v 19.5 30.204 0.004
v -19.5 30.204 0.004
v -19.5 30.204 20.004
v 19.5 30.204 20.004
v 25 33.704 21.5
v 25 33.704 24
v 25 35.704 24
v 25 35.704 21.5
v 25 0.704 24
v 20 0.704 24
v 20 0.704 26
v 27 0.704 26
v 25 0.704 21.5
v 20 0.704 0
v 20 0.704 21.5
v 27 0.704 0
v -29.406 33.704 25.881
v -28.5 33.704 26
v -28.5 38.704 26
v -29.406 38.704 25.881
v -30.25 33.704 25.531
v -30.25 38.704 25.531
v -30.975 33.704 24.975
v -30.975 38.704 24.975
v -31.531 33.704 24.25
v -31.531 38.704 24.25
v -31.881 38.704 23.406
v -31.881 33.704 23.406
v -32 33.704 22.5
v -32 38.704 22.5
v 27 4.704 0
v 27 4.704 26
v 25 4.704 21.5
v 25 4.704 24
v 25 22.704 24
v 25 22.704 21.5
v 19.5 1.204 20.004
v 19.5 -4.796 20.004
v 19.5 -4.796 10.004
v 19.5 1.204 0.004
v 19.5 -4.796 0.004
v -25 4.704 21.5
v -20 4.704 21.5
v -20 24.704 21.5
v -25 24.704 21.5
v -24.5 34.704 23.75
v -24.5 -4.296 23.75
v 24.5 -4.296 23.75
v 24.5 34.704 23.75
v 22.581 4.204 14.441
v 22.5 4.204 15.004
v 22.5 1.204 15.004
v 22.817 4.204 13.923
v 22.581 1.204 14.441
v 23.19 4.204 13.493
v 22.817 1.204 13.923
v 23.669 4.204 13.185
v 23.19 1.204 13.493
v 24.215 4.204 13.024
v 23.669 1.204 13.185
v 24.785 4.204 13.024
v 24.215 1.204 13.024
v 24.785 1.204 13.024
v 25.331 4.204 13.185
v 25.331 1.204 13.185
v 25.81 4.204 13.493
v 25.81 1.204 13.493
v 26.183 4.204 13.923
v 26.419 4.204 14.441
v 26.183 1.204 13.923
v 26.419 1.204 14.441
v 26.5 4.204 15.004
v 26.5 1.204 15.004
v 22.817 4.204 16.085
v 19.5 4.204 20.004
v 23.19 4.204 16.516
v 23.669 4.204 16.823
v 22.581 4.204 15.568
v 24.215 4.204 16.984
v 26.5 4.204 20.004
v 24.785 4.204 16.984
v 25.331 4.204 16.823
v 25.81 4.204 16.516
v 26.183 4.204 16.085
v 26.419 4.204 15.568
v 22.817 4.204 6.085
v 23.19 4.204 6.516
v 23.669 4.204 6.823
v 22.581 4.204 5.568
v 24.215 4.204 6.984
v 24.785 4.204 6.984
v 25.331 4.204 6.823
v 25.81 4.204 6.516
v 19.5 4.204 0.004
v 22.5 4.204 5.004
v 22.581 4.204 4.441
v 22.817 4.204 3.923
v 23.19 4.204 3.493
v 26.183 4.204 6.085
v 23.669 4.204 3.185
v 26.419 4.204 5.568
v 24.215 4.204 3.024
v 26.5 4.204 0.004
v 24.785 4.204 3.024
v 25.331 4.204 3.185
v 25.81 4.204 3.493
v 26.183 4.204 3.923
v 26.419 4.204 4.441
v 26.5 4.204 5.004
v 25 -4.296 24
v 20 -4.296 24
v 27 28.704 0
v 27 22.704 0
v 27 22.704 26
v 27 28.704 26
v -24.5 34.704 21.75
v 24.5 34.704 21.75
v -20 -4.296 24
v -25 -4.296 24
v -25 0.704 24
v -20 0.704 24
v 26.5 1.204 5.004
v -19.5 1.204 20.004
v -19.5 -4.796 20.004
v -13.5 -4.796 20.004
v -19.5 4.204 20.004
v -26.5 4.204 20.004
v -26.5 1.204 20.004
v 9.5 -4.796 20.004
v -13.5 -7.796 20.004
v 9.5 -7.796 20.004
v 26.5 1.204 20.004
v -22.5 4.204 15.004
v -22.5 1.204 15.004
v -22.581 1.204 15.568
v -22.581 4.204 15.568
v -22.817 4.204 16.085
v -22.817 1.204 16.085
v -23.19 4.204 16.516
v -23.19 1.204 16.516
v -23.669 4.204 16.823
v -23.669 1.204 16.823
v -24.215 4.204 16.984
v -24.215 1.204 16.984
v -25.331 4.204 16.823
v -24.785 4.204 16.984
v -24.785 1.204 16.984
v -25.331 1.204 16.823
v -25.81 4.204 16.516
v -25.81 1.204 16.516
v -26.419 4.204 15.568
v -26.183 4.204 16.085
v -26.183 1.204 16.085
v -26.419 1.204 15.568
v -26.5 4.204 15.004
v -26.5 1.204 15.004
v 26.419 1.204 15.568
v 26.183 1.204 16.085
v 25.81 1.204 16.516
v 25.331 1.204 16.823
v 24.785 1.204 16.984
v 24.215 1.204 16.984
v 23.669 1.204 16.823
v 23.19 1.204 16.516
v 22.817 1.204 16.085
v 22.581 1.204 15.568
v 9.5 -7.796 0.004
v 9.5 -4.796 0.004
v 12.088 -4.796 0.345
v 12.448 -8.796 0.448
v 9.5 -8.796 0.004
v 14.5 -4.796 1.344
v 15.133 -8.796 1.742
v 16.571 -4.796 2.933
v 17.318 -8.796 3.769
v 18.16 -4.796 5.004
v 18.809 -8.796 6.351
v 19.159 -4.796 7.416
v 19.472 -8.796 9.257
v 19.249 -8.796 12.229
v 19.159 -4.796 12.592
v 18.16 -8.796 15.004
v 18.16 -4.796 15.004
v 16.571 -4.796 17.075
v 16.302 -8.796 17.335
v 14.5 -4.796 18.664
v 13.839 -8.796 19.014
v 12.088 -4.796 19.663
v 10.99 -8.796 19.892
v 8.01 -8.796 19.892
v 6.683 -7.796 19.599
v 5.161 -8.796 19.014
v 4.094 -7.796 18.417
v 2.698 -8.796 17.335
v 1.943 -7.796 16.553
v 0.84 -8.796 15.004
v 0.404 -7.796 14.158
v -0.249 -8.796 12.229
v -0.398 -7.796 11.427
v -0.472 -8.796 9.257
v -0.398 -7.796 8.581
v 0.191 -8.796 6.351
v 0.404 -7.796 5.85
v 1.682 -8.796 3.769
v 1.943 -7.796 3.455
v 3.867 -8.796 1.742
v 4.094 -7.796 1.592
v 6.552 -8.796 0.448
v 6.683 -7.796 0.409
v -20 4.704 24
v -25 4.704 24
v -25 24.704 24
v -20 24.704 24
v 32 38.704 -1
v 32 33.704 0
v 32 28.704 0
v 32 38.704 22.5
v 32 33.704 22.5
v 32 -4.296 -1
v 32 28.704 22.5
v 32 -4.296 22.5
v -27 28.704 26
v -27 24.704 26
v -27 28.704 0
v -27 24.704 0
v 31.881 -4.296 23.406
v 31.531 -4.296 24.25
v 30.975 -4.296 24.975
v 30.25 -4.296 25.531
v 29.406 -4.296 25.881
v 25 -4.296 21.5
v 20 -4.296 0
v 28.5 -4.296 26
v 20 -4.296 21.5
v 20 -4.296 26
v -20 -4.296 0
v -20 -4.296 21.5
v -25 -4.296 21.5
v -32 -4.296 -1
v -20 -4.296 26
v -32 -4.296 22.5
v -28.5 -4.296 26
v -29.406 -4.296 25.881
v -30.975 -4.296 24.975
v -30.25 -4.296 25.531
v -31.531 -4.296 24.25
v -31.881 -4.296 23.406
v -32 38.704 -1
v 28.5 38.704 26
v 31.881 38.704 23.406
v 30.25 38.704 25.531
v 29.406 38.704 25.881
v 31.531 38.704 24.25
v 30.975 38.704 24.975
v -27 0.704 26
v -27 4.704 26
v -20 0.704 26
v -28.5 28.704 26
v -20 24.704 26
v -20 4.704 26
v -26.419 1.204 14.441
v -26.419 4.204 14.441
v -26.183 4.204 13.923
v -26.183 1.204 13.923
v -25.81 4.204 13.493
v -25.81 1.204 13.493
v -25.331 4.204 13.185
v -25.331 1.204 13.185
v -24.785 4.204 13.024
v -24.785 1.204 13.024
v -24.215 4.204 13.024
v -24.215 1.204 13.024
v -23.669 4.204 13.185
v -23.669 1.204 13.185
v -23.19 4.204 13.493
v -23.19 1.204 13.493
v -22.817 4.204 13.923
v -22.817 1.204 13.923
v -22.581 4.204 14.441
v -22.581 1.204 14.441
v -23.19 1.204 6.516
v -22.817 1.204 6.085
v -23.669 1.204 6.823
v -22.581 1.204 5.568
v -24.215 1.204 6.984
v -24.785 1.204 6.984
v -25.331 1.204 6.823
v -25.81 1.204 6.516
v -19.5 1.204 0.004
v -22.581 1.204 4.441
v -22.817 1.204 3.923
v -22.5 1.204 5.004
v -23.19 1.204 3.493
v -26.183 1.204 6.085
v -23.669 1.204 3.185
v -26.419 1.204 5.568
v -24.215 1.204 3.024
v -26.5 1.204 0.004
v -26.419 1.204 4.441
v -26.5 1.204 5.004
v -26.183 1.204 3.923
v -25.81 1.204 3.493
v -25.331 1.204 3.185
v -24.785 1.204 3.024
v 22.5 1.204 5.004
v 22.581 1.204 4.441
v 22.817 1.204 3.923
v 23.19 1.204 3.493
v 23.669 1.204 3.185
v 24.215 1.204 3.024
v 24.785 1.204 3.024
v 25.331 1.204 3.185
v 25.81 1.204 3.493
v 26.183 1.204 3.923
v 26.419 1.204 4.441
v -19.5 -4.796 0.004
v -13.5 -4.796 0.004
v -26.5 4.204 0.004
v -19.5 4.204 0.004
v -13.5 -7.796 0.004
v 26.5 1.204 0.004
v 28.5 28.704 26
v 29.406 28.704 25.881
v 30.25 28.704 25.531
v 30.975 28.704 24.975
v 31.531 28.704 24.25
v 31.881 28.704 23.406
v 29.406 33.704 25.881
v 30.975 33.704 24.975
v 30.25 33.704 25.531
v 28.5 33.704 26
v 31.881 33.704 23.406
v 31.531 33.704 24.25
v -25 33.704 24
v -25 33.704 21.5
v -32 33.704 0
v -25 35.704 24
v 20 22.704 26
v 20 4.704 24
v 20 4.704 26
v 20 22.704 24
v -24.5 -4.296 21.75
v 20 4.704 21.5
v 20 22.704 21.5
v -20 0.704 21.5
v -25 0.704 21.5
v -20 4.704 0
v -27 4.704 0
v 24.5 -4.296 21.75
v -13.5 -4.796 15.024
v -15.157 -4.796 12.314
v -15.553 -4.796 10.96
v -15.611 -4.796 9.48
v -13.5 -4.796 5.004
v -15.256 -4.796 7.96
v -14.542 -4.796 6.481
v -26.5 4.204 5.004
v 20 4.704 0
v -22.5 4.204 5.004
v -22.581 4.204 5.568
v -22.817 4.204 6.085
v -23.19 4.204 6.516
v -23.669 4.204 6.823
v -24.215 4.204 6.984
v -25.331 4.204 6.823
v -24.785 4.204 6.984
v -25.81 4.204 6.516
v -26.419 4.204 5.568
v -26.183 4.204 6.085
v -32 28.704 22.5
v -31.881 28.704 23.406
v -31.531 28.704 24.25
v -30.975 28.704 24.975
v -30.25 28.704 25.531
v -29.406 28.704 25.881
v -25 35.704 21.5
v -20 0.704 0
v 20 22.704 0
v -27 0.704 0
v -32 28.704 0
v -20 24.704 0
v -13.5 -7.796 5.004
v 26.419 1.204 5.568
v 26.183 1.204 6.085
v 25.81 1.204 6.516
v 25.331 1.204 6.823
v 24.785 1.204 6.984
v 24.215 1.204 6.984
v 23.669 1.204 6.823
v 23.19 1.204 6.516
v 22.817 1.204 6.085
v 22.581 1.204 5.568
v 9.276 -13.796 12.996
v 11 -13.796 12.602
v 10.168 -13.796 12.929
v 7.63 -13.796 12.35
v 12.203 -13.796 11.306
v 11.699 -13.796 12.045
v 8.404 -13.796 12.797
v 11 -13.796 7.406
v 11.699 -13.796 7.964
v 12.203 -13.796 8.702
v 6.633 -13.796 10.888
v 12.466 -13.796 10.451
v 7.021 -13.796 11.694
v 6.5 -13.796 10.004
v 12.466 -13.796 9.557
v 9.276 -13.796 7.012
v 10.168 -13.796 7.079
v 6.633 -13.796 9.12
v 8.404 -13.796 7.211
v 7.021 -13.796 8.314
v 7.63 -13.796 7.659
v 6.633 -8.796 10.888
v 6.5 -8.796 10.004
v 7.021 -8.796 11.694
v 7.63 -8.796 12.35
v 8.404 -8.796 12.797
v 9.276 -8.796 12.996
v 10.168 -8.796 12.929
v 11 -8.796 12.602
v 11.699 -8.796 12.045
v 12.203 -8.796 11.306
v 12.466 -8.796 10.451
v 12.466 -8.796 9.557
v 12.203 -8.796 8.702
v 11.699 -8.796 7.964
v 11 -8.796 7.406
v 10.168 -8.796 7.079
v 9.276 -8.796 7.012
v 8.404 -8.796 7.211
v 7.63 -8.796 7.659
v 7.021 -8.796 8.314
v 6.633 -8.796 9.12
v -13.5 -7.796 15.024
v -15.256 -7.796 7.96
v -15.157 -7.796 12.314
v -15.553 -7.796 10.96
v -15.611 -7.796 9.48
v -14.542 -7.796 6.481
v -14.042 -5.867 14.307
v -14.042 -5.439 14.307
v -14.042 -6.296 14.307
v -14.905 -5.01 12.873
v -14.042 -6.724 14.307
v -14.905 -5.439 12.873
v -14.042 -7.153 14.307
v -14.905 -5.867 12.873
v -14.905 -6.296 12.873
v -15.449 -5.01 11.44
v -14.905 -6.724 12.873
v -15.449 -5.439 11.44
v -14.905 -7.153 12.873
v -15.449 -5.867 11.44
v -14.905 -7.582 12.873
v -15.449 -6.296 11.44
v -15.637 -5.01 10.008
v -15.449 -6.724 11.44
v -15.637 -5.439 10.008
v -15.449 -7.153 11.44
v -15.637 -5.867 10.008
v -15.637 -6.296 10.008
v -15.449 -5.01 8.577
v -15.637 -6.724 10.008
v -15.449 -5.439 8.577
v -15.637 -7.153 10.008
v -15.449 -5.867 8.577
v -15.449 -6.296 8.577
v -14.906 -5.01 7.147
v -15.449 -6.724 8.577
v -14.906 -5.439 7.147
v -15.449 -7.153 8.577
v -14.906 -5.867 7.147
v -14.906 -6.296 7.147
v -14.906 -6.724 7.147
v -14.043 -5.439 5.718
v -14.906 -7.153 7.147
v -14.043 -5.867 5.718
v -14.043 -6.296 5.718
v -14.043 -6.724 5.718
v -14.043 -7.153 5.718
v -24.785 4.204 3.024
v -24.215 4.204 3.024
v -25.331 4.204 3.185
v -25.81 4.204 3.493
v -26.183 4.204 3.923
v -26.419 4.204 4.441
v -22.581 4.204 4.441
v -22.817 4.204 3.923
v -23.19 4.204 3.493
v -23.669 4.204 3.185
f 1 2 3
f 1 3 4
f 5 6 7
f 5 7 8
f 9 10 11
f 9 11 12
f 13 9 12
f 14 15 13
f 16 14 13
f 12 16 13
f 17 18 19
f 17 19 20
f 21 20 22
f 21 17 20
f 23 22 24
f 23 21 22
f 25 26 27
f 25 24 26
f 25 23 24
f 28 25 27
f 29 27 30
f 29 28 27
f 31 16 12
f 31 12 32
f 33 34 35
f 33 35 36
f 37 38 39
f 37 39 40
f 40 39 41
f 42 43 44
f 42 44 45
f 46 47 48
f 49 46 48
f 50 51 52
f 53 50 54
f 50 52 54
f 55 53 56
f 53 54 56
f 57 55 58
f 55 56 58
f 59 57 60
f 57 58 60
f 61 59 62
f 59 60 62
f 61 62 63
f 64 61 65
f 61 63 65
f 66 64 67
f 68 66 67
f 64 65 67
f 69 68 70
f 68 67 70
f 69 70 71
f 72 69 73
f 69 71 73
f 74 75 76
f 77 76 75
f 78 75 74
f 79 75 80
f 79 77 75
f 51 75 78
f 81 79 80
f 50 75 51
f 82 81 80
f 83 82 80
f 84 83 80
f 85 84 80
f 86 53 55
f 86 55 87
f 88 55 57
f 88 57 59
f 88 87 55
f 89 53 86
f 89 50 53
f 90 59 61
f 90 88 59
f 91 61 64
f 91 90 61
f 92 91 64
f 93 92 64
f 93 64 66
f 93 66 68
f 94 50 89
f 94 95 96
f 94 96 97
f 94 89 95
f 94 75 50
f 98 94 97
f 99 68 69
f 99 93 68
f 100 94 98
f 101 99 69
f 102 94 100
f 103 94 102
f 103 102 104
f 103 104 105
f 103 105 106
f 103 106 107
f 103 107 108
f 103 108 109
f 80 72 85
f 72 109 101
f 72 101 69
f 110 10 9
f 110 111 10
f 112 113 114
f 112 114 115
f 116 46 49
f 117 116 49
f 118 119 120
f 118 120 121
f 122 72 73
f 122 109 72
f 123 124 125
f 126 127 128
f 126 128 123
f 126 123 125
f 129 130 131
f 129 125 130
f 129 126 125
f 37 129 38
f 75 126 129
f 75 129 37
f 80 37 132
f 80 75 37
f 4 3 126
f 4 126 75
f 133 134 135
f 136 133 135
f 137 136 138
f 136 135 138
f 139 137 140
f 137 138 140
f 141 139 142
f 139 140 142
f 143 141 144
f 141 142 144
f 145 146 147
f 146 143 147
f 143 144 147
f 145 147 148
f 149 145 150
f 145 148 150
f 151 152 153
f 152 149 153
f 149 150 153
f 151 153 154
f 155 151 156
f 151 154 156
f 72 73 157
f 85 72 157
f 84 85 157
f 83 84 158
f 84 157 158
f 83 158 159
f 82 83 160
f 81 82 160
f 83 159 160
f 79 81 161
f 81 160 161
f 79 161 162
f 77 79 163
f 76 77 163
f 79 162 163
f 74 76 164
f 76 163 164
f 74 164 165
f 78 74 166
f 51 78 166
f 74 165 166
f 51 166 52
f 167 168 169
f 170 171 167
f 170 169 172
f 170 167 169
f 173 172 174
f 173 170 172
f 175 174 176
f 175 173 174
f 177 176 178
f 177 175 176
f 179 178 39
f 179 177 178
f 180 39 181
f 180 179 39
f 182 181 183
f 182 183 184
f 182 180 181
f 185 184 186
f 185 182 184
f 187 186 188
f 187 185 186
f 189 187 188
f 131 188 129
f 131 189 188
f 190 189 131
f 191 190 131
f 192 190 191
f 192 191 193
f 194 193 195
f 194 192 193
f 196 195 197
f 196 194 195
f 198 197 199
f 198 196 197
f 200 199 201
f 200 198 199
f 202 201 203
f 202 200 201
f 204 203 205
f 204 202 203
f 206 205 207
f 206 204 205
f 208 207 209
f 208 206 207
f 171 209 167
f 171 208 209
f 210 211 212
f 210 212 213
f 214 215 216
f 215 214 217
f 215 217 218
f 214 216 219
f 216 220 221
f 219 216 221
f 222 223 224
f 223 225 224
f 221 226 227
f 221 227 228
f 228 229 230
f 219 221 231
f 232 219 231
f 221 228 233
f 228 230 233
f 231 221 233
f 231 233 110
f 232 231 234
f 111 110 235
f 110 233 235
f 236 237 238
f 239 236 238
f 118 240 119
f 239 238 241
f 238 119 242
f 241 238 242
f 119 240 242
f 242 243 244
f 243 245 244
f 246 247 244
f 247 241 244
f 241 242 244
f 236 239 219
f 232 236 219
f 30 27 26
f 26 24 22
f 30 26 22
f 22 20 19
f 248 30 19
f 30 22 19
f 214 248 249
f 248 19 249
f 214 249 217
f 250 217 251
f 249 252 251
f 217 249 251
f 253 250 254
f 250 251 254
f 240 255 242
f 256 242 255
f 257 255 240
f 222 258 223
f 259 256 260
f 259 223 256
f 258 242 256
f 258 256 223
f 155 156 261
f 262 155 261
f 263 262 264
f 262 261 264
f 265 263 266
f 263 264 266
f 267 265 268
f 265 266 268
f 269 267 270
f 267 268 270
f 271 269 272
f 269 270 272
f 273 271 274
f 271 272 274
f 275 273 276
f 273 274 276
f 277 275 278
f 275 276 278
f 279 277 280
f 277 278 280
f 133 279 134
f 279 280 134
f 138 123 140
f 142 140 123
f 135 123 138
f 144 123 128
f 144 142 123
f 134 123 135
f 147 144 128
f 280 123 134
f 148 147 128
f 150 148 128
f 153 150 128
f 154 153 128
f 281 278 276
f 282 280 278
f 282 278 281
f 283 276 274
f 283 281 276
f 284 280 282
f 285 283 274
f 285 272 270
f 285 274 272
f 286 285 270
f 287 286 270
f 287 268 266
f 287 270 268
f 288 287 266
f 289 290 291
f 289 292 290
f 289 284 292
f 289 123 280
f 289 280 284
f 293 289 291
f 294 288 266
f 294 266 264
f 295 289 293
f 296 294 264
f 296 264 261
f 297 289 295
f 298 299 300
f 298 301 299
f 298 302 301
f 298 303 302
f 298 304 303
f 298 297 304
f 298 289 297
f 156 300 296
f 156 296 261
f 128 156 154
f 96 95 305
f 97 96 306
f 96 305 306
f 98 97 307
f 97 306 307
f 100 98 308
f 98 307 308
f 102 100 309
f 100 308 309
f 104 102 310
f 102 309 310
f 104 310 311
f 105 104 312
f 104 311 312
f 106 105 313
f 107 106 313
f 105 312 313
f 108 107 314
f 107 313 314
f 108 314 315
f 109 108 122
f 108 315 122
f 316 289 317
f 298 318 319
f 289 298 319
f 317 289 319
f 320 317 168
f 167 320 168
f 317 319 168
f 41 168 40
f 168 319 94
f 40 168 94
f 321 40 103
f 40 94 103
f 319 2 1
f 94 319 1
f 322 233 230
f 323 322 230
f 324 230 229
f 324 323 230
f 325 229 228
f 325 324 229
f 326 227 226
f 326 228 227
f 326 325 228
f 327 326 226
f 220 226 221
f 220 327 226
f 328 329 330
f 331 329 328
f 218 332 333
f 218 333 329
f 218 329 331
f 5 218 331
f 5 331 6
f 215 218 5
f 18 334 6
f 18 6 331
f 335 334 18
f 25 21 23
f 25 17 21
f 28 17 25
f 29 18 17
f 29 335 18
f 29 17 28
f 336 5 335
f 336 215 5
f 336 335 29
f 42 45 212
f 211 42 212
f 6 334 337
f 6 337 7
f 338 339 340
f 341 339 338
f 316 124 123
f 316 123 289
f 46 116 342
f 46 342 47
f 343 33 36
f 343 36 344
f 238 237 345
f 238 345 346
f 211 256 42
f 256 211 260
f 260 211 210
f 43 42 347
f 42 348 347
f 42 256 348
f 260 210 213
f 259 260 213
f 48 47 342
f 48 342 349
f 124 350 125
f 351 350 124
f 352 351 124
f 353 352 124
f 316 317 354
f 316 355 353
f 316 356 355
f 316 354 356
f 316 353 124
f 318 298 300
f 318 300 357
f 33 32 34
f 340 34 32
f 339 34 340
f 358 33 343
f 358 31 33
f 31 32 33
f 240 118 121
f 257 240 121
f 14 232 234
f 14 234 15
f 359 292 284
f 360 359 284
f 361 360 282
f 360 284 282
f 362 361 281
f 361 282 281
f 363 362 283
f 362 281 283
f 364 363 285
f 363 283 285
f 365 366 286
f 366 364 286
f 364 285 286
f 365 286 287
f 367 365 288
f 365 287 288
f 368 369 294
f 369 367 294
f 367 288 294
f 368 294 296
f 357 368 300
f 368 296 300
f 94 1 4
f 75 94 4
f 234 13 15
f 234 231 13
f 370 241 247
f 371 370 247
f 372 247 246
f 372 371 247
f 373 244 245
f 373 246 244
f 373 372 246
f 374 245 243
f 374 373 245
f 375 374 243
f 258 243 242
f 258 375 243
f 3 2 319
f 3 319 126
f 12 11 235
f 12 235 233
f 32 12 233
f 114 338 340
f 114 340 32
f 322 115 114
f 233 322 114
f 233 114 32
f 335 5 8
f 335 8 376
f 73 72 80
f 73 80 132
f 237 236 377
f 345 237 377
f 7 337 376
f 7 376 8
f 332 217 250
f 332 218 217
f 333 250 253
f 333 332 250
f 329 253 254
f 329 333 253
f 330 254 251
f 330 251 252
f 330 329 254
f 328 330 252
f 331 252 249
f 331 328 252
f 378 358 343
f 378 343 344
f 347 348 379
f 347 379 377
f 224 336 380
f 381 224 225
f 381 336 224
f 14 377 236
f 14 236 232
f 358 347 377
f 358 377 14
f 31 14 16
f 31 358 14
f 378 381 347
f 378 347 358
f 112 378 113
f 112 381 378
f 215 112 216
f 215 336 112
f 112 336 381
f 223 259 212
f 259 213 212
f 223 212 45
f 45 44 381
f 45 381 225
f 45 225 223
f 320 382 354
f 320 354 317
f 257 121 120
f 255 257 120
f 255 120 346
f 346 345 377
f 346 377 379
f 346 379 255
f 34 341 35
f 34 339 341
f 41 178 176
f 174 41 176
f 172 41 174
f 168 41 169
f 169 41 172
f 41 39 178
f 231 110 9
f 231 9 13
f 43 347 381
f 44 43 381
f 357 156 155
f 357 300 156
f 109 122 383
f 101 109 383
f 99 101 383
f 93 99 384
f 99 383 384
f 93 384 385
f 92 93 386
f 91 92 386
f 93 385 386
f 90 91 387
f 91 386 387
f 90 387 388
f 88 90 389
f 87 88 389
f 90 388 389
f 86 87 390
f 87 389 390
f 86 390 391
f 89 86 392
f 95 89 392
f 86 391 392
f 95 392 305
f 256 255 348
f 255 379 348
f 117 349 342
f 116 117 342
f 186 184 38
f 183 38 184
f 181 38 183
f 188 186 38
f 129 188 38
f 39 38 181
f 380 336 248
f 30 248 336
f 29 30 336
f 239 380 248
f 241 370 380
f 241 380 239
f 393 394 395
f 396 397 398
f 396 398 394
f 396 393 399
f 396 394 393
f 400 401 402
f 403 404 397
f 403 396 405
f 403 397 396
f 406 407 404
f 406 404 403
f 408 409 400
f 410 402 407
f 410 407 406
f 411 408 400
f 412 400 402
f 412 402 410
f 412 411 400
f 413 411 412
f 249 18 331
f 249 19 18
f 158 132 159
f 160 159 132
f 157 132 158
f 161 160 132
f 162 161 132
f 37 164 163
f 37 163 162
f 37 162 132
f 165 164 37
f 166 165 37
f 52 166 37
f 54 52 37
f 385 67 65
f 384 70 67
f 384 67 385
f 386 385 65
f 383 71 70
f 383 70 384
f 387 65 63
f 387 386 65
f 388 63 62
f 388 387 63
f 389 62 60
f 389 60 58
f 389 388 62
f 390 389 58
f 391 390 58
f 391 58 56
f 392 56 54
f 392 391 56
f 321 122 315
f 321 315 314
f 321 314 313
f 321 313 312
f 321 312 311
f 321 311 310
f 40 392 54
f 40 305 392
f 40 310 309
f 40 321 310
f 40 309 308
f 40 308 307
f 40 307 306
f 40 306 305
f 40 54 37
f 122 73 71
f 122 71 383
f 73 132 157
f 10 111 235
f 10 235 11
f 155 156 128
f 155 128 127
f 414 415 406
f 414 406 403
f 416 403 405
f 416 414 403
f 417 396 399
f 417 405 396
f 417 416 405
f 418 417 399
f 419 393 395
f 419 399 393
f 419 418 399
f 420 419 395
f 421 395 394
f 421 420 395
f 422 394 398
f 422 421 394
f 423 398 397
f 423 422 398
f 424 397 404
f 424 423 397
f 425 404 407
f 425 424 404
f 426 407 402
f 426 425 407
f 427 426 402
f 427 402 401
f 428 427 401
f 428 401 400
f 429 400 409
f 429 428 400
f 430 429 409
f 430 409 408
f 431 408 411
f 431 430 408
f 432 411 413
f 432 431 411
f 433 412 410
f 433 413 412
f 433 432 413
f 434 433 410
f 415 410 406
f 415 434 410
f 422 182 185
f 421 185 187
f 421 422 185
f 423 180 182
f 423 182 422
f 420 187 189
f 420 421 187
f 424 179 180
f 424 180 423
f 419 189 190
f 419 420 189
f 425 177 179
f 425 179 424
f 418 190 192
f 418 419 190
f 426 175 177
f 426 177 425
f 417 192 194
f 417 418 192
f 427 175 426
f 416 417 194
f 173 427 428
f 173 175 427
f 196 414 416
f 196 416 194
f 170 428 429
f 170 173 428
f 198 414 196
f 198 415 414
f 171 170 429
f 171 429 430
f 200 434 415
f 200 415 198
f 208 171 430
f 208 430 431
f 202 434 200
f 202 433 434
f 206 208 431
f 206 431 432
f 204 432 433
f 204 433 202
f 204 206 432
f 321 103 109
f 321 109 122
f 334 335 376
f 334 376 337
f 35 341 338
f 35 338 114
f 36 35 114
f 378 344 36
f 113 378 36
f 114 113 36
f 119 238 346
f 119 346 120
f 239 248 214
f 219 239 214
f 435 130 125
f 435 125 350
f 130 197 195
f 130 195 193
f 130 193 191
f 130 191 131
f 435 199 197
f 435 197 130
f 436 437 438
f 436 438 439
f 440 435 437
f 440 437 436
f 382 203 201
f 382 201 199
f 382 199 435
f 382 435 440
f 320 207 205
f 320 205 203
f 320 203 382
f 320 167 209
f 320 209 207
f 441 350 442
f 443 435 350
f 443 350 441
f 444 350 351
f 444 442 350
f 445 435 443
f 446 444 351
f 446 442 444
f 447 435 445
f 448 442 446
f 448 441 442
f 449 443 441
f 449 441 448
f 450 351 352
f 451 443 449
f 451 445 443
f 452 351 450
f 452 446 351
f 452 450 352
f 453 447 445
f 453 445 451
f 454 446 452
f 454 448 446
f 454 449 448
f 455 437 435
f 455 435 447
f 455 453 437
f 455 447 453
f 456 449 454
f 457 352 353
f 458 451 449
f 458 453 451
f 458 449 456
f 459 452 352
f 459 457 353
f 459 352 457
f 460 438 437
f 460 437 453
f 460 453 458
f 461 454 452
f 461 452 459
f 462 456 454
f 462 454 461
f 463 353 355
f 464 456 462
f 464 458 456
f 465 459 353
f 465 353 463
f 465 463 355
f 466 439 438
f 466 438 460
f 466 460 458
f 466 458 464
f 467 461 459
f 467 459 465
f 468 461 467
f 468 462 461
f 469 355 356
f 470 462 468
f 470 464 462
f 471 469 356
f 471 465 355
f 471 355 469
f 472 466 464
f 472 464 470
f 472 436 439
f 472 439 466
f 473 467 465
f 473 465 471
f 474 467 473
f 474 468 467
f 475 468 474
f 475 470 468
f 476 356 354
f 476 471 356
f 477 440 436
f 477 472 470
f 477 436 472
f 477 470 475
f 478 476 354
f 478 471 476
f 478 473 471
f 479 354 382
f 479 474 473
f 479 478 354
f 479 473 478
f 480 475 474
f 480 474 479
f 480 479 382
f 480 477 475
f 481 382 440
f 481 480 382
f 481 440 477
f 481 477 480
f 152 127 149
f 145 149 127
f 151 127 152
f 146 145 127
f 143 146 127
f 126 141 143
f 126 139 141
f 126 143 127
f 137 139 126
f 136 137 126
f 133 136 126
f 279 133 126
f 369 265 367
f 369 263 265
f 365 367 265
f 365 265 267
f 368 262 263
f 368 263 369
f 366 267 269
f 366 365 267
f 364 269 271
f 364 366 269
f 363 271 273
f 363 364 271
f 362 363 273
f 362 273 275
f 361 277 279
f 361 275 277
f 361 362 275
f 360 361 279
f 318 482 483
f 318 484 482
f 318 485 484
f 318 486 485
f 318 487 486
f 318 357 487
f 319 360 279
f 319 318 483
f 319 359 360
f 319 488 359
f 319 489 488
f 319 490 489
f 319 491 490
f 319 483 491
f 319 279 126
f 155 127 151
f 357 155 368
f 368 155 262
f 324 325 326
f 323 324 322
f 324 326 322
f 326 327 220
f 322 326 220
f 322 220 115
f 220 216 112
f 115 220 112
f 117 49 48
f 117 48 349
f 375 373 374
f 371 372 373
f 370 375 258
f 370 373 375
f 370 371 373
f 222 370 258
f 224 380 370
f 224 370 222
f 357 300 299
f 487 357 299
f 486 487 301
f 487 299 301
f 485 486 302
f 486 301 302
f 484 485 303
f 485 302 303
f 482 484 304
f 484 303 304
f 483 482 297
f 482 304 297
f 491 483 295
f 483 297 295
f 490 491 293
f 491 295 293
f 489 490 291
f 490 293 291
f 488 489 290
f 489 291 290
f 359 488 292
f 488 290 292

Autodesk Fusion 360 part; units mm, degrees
sketch "Sketch1" plane through (0, 0, 0) normal (0, 1, 0) x (1, 0, 0) in component "actual acutator v0 v1"
  line L0 (0, 0) -> (53, 0)
  line L1 (53, 0) -> (53, -39)
  line L2 (53, -39) -> (0, -39)
  line L3 (0, -39) -> (0, 0)
  dimension "d1" = 53
  dimension "d2" = 39
extrude "Extrude1" add sketch "Sketch1" along normal blind 20 makes body 1 in component "actual acutator v0 v1"
sketch "Sketch2" plane through (0, 0, 39) normal (0, 0, 1) x (-1, 0, 0) in component "actual acutator v0 v1"
  line L0 (0, 0) -> (-53, 0)
  line L1 (-53, 0) -> (-53, -20)
  line L2 (-53, -20) -> (0, -20)
  line L3 (0, -20) -> (0, 0)
  line L4 (0, -20) -> (-7, -20)
  line L5 (-7, -20) -> (-7, 0)
  line L6 (-7, 0) -> (0, 0)
  line L7 (0, 0) -> (0, -20)
  line L8 (-53, -20) -> (-46, -20)
  line L9 (-46, -20) -> (-46, 0)
  line L10 (-46, 0) -> (-53, 0)
  line L11 (-53, 0) -> (-53, -20)
  dimension "d5" = 7
  dimension "d6" = 7
extrude "Extrude2" cut sketch "Sketch2" against normal blind 10 contours L0 L2 L3 L4 L5 L6 L7 | L0 L1 L2 L8 L9 L10 L11 bodies 1 in component "actual acutator v0 v1"
sketch "Sketch3" plane through (0, 0, 0) normal (0, 0, -1) x (1, 0, 0) in component "actual acutator v0 v1"
  line L0 (53, 0) -> (0, 0)
  line L1 (0, 0) -> (0, -20)
  line L2 (0, -20) -> (53, -20)
  line L3 (53, -20) -> (53, 0)
  line L4 (0, 0) -> (7, 0)
  line L5 (7, 0) -> (7, -20)
  line L6 (7, -20) -> (0, -20)
  line L7 (0, -20) -> (0, 0)
  line L8 (53, 0) -> (46, 0)
  line L9 (46, 0) -> (46, -20)
  line L10 (46, -20) -> (53, -20)
  line L11 (53, -20) -> (53, 0)
  dimension "d9" = 7
  dimension "d10" = 7
extrude "Extrude3" cut sketch "Sketch3" against normal blind 26 contours L0 L2 L3 L8 L9 L10 L11 | L0 L1 L2 L4 L5 L6 L7 bodies 1 in component "actual acutator v0 v1"
sketch "Sketch4" plane through (0, 0, 39) normal (0, 0, 1) x (-1, 0, 0) in component "actual acutator v0 v1"
  line L0 (-7, -20) -> (-7, 0)
  line L1 (-7, 0) -> (-46, 0)
  line L2 (-46, 0) -> (-46, -20)
  line L3 (-46, -20) -> (-7, -20)
  line L4 (-7, -20) -> (-13, -20)
  line L5 (-13, -20) -> (-13, 0)
  line L6 (-13, 0) -> (-7, 0)
  line L7 (-7, 0) -> (-7, -20)
  circle A0 centre (-36, -10) radius 10
  circle A1 centre (-36, -10) radius 6.5
  circle A2 centre (-36, -10) radius 3
  spline S0 degree 5 poles (-13, -15.0203) (-12.838, -14.8194) (-12.5281, -14.4176) (-12.1057, -13.8151) (-11.6287, -13.012) (-11.1861, -12.0086) (-10.9107, -11.0057) (-10.8163, -10.0034) (-10.9104, -9.0017) (-11.1856, -8.0005) (-11.6282, -6.9998) (-12.1053, -6.1997) (-12.5279, -5.5998) (-12.8379, -5.1999) (-13, -5) knots 0 0 0 0 0 0 0.1 0.2 0.3 0.4 0.5 0.6 0.7 0.8 0.9 1 1 1 1 1 1
  point P0 (-13, -10)
  point P1 (-13, -15.0203)
  point P2 (-13, -5)
  point P3 (-10.8633, -10)
  dimension "d13" = 6
  dimension "d14" = 20
  dimension "d15" = 13
  dimension "d16" = 6
extrude "Extrude4" cut sketch "Sketch4" against normal blind 4 contours L0 L1 L3 L4 L5 L6 L7 S0 | L2 L3 A0 | L1 L2 A0 bodies 1 in component "actual acutator v0 v1"
extrude "Extrude5" cut sketch "Sketch4" against normal blind 1 contours L1 L3 L5 A0 | L2 L3 A0 | L5 S0 | L1 L2 A0 bodies 1 in component "actual acutator v0 v1"
extrude "Extrude6" add sketch "Sketch4" along normal blind 5 contours A2 bodies 1 in component "actual acutator v0 v1"
sketch "Sketch5" plane through (0, 0, 29) normal (0, 0, 1) x (-1, 0, 0) in component "actual acutator v0 v1"
  line L0 (-53, 0) -> (-53, -20)
  line L1 (-53, -20) -> (-46, -20)
  line L2 (-46, -20) -> (-46, 0)
  line L3 (-46, 0) -> (-53, 0)
  line L4 (-53, 0) -> (-51, 0)
  line L5 (-51, 0) -> (-51, -5)
  line L6 (-51, -5) -> (-53, -5)
  line L7 (-53, -5) -> (-53, 0)
  circle A0 centre (-51, -5) radius 2
  line L8 (-53, -20) -> (-51, -20)
  line L9 (-51, -20) -> (-51, -15)
  line L10 (-51, -15) -> (-53, -15)
  line L11 (-53, -15) -> (-53, -20)
  circle A1 centre (-51, -15) radius 2
  dimension "d23" = 2
  dimension "d24" = 5
  dimension "d25" = 4
  dimension "d26" = 2
  dimension "d27" = 5
  dimension "d28" = 4
extrude "Extrude7" cut sketch "Sketch5" against normal blind 3 contours L5 L6 A0 | L5 L6 A0 | L9 L10 A1 | L9 L10 A1 bodies 1 in component "actual acutator v0 v1"
ref_plane "WorkPlane1" through (26.5, 0, 0) normal (1, 0, 0) x (0, 1, 0) in component "actual acutator v0 v1"
mirror "Mirror1" about plane through (26.5, 0, 0) normal (1, 0, 0) of "Extrude7" in component "actual acutator v0 v1"
sketch "Sketch1 (2)" plane through (0, 0, 0) normal (0, 0, 1) x (1, 0, 0) in component "casing"
  line L0 (-13.5, -7.7959) -> (9.5, -7.7959)
  line L1 (9.5, -7.7959) -> (9.5, -4.7959)
  line L2 (9.5, -4.7959) -> (19.5, -4.7959)
  line L3 (19.5, -4.7959) -> (19.5, 1.2041)
  line L4 (19.5, 1.2041) -> (26.5, 1.2041)
  line L5 (26.5, 1.2041) -> (26.5, 4.2041)
  line L6 (26.5, 4.2041) -> (19.5, 4.2041)
  line L7 (19.5, 4.2041) -> (19.5, 30.2041)
  line L8 (19.5, 30.2041) -> (-19.5, 30.2041)
  line L9 (-19.5, 30.2041) -> (-19.5, 4.2041)
  line L10 (-19.5, 4.2041) -> (-26.5, 4.2041)
  line L11 (-26.5, 4.2041) -> (-26.5, 1.2041)
  line L12 (-26.5, 1.2041) -> (-19.5, 1.2041)
  line L13 (-19.5, 1.2041) -> (-19.5, -4.7959)
  line L14 (-19.5, -4.7959) -> (-13.5, -4.7959)
  line L15 (-13.5, -4.7959) -> (-13.5, -7.7959)
  line L16 (-20, 0.7041) -> (-32, 0.7041)
  line L17 (-32, 0.7041) -> (-32, -4.2959)
  line L18 (-32, -4.2959) -> (-20, -4.2959)
  line L19 (-20, -4.2959) -> (-20, 0.7041)
  line L20 (-32, 0.7041) -> (-27, 0.7041)
  line L21 (-27, 0.7041) -> (-27, 38.7041)
  line L22 (-27, 38.7041) -> (-32, 38.7041)
  line L23 (-32, 38.7041) -> (-32, 0.7041)
  line L24 (-27, 38.7041) -> (27, 38.7041)
  line L25 (27, 38.7041) -> (27, 33.7041)
  line L26 (27, 33.7041) -> (-27, 33.7041)
  line L27 (-27, 33.7041) -> (-27, 38.7041)
  line L28 (20, 0.7041) -> (32, 0.7041)
  line L29 (32, 0.7041) -> (32, -4.2959)
  line L30 (32, -4.2959) -> (20, -4.2959)
  line L31 (20, -4.2959) -> (20, 0.7041)
  line L32 (32, 0.7041) -> (27, 0.7041)
  line L33 (27, 0.7041) -> (27, 38.7041)
  line L34 (27, 38.7041) -> (32, 38.7041)
  line L35 (32, 38.7041) -> (32, 0.7041)
  line L36 (27, 4.7041) -> (20, 4.7041)
  line L37 (20, 4.7041) -> (20, 22.7041)
  line L38 (20, 22.7041) -> (27, 22.7041)
  line L39 (27, 22.7041) -> (27, 4.7041)
  line L40 (-27, 4.7041) -> (-20, 4.7041)
  line L41 (-20, 4.7041) -> (-20, 24.7041)
  line L42 (-20, 24.7041) -> (-27, 24.7041)
  line L43 (-27, 24.7041) -> (-27, 4.7041)
  line L44 (-32, 38.7041) -> (32, 38.7041)
  line L45 (32, 38.7041) -> (32, -4.2959)
  line L46 (32, -4.2959) -> (-32, -4.2959)
  line L47 (-32, -4.2959) -> (-32, 38.7041)
  line L48 (-27, 33.7041) -> (-32, 33.7041)
  line L49 (-32, 33.7041) -> (-32, 28.7041)
  line L50 (-32, 28.7041) -> (-27, 28.7041)
  line L51 (-27, 28.7041) -> (-27, 33.7041)
  line L52 (27, 33.7041) -> (32, 33.7041)
  line L53 (32, 33.7041) -> (32, 28.7041)
  line L54 (32, 28.7041) -> (27, 28.7041)
  line L55 (27, 28.7041) -> (27, 33.7041)
  dimension "d34" = 0.5
  dimension "d35" = 0.5
  dimension "d36" = 5
  dimension "d37" = 12
  dimension "d38" = 0.5
  dimension "d39" = 3.5
  dimension "d40" = 5
  dimension "d41" = 0.5
  dimension "d42" = 0.5
  dimension "d43" = 12
  dimension "d44" = 5
  dimension "d45" = 0.5
  dimension "d46" = 0.5
  dimension "d47" = 0.5
  dimension "d48" = 18
  dimension "d49" = 0.5
  dimension "d50" = 0.5
  dimension "d51" = 20
  dimension "d56" = 5
  dimension "d57" = 5
extrude "Extrude1'" add sketch "Sketch1 (2)" against normal blind 1 separate body contours L3 L4 L5 L6 L7 L8 L9 L10 L11 L12 L13 L16 L19 L21 L26 L28 L31 L33 L36 L37 L38 L40 L41 L42 L46 L51 L55 | L3 L4 L5 L6 L7 L8 L9 L10 L11 L12 L13 L46 | L16 L17 L18 L19 L20 L46 L47 | L28 L29 L30 L31 L32 L45 L46 | L16 L20 L21 L23 L43 L47 L50 | L28 L32 L33 L35 L39 L45 L54 | L21 L23 L47 L48 L49 L50 L51 | L21 L40 L41 L42 L43 | L33 L35 L45 L52 L53 L54 L55 | L33 L36 L37 L38 L39 | L21 L22 L23 L27 L44 L47 L48 | L25 L33 L34 L35 L44 L45 L52 | L21 L24 L25 L26 L27 L33 L44 makes body 2 in component "casing"
extrude "Extrude2'" add sketch "Sketch1 (2)" along normal blind 26 contours L16 L17 L18 L19 L20 L46 L47 | L28 L29 L30 L31 L32 L45 L46 | L16 L20 L21 L23 L43 L47 L50 | L28 L32 L33 L35 L39 L45 L54 | L21 L40 L41 L42 L43 | L33 L36 L37 L38 L39 | L21 L22 L23 L27 L44 L47 L48 | L25 L33 L34 L35 L44 L45 L52 | L21 L24 L25 L26 L27 L33 L44 bodies 2 in component "casing"
sketch "Sketch2 (2)" plane through (0, -4.2959, 0) normal (0, -1, 0) x (1, 0, 0) in component "casing"
  line L0 (20, 0) -> (-20, 0)
  line L1 (-20, 0) -> (-20, 26)
  line L2 (-20, 26) -> (-32, 26)
  line L3 (-32, 26) -> (-32, -1)
  line L4 (-32, -1) -> (32, -1)
  line L5 (32, -1) -> (32, 26)
  line L6 (32, 26) -> (20, 26)
  line L7 (20, 26) -> (20, 0)
  line L8 (-25, 24) -> (25, 24)
  line L9 (25, 24) -> (25, 21.5)
  line L10 (25, 21.5) -> (-25, 21.5)
  line L11 (-25, 21.5) -> (-25, 24)
  line L12 (-32, 26) -> (32, 26)
  dimension "d58" = 2.5
  dimension "d59" = 50
  dimension "d60" = 2
  dimension "d61" = 7
extrude "Extrude3'" cut sketch "Sketch2 (2)" against normal blind 40 contours L1 L7 L8 L10 | L7 L8 L9 L10 | L1 L8 L10 L11 bodies 2 in component "casing"
sketch "Sketch1 (3)" plane through (0, -4.2959, 0) normal (0, -1, 0) x (1, 0, 0) in component "lid"
  line L0 (-20, 21.5) -> (-25, 21.5)
  line L1 (-25, 21.5) -> (-25, 24)
  line L2 (-25, 24) -> (-20, 24)
  line L3 (-20, 24) -> (-20, 26)
  line L4 (-20, 26) -> (-32, 26)
  line L5 (-32, 26) -> (-32, -1)
  line L6 (-32, -1) -> (32, -1)
  line L7 (32, -1) -> (32, 26)
  line L8 (32, 26) -> (20, 26)
  line L9 (20, 26) -> (20, 24)
  line L10 (20, 24) -> (25, 24)
  line L11 (25, 24) -> (25, 21.5)
  line L12 (25, 21.5) -> (20, 21.5)
  line L13 (20, 21.5) -> (20, 0)
  line L14 (20, 0) -> (-20, 0)
  line L15 (-20, 0) -> (-20, 21.5)
  line L16 (24.5, 21.75) -> (-24.5, 21.75)
  line L17 (-24.5, 21.75) -> (-24.5, 23.75)
  line L18 (-24.5, 23.75) -> (24.5, 23.75)
  line L19 (24.5, 23.75) -> (24.5, 21.75)
  line L20 (24.5, 21.75) -> (-24.5, 23.75) construction
  line L21 (-24.5, 21.75) -> (24.5, 23.75) construction
  point P0 (0, 22.75)
  dimension "d64" = 49
  dimension "d65" = 2
  dimension "d66" = 2.25
  dimension "d67" = 0.5
extrude "Extrude1''" add sketch "Sketch1 (3)" against normal blind 39 separate body contours L16 L17 L18 L19 makes body 3 in component "lid"
fillet "Fillet1" radius 3.5 4 edges at (-32, 12.2041, 26) (32, 12.2041, 26) (32, 36.2041, 26) (-32, 36.2041, 26) on bodies 2 in component "casing"
component "actual acutator v0 v1" placed x (1, 0, 0) y (0, 0, 1) z (0, -1, 0) at (-26.5, 30.2041, 0.0041)
component "casing" placed x (1, 0, 0) y (0, 1, 0) z (0, 0, 1) at (0, 0, 0)
component "lid" placed x (1, 0, 0) y (0, 1, 0) z (0, 0, 1) at (0, 0, 0) in component "casing"
